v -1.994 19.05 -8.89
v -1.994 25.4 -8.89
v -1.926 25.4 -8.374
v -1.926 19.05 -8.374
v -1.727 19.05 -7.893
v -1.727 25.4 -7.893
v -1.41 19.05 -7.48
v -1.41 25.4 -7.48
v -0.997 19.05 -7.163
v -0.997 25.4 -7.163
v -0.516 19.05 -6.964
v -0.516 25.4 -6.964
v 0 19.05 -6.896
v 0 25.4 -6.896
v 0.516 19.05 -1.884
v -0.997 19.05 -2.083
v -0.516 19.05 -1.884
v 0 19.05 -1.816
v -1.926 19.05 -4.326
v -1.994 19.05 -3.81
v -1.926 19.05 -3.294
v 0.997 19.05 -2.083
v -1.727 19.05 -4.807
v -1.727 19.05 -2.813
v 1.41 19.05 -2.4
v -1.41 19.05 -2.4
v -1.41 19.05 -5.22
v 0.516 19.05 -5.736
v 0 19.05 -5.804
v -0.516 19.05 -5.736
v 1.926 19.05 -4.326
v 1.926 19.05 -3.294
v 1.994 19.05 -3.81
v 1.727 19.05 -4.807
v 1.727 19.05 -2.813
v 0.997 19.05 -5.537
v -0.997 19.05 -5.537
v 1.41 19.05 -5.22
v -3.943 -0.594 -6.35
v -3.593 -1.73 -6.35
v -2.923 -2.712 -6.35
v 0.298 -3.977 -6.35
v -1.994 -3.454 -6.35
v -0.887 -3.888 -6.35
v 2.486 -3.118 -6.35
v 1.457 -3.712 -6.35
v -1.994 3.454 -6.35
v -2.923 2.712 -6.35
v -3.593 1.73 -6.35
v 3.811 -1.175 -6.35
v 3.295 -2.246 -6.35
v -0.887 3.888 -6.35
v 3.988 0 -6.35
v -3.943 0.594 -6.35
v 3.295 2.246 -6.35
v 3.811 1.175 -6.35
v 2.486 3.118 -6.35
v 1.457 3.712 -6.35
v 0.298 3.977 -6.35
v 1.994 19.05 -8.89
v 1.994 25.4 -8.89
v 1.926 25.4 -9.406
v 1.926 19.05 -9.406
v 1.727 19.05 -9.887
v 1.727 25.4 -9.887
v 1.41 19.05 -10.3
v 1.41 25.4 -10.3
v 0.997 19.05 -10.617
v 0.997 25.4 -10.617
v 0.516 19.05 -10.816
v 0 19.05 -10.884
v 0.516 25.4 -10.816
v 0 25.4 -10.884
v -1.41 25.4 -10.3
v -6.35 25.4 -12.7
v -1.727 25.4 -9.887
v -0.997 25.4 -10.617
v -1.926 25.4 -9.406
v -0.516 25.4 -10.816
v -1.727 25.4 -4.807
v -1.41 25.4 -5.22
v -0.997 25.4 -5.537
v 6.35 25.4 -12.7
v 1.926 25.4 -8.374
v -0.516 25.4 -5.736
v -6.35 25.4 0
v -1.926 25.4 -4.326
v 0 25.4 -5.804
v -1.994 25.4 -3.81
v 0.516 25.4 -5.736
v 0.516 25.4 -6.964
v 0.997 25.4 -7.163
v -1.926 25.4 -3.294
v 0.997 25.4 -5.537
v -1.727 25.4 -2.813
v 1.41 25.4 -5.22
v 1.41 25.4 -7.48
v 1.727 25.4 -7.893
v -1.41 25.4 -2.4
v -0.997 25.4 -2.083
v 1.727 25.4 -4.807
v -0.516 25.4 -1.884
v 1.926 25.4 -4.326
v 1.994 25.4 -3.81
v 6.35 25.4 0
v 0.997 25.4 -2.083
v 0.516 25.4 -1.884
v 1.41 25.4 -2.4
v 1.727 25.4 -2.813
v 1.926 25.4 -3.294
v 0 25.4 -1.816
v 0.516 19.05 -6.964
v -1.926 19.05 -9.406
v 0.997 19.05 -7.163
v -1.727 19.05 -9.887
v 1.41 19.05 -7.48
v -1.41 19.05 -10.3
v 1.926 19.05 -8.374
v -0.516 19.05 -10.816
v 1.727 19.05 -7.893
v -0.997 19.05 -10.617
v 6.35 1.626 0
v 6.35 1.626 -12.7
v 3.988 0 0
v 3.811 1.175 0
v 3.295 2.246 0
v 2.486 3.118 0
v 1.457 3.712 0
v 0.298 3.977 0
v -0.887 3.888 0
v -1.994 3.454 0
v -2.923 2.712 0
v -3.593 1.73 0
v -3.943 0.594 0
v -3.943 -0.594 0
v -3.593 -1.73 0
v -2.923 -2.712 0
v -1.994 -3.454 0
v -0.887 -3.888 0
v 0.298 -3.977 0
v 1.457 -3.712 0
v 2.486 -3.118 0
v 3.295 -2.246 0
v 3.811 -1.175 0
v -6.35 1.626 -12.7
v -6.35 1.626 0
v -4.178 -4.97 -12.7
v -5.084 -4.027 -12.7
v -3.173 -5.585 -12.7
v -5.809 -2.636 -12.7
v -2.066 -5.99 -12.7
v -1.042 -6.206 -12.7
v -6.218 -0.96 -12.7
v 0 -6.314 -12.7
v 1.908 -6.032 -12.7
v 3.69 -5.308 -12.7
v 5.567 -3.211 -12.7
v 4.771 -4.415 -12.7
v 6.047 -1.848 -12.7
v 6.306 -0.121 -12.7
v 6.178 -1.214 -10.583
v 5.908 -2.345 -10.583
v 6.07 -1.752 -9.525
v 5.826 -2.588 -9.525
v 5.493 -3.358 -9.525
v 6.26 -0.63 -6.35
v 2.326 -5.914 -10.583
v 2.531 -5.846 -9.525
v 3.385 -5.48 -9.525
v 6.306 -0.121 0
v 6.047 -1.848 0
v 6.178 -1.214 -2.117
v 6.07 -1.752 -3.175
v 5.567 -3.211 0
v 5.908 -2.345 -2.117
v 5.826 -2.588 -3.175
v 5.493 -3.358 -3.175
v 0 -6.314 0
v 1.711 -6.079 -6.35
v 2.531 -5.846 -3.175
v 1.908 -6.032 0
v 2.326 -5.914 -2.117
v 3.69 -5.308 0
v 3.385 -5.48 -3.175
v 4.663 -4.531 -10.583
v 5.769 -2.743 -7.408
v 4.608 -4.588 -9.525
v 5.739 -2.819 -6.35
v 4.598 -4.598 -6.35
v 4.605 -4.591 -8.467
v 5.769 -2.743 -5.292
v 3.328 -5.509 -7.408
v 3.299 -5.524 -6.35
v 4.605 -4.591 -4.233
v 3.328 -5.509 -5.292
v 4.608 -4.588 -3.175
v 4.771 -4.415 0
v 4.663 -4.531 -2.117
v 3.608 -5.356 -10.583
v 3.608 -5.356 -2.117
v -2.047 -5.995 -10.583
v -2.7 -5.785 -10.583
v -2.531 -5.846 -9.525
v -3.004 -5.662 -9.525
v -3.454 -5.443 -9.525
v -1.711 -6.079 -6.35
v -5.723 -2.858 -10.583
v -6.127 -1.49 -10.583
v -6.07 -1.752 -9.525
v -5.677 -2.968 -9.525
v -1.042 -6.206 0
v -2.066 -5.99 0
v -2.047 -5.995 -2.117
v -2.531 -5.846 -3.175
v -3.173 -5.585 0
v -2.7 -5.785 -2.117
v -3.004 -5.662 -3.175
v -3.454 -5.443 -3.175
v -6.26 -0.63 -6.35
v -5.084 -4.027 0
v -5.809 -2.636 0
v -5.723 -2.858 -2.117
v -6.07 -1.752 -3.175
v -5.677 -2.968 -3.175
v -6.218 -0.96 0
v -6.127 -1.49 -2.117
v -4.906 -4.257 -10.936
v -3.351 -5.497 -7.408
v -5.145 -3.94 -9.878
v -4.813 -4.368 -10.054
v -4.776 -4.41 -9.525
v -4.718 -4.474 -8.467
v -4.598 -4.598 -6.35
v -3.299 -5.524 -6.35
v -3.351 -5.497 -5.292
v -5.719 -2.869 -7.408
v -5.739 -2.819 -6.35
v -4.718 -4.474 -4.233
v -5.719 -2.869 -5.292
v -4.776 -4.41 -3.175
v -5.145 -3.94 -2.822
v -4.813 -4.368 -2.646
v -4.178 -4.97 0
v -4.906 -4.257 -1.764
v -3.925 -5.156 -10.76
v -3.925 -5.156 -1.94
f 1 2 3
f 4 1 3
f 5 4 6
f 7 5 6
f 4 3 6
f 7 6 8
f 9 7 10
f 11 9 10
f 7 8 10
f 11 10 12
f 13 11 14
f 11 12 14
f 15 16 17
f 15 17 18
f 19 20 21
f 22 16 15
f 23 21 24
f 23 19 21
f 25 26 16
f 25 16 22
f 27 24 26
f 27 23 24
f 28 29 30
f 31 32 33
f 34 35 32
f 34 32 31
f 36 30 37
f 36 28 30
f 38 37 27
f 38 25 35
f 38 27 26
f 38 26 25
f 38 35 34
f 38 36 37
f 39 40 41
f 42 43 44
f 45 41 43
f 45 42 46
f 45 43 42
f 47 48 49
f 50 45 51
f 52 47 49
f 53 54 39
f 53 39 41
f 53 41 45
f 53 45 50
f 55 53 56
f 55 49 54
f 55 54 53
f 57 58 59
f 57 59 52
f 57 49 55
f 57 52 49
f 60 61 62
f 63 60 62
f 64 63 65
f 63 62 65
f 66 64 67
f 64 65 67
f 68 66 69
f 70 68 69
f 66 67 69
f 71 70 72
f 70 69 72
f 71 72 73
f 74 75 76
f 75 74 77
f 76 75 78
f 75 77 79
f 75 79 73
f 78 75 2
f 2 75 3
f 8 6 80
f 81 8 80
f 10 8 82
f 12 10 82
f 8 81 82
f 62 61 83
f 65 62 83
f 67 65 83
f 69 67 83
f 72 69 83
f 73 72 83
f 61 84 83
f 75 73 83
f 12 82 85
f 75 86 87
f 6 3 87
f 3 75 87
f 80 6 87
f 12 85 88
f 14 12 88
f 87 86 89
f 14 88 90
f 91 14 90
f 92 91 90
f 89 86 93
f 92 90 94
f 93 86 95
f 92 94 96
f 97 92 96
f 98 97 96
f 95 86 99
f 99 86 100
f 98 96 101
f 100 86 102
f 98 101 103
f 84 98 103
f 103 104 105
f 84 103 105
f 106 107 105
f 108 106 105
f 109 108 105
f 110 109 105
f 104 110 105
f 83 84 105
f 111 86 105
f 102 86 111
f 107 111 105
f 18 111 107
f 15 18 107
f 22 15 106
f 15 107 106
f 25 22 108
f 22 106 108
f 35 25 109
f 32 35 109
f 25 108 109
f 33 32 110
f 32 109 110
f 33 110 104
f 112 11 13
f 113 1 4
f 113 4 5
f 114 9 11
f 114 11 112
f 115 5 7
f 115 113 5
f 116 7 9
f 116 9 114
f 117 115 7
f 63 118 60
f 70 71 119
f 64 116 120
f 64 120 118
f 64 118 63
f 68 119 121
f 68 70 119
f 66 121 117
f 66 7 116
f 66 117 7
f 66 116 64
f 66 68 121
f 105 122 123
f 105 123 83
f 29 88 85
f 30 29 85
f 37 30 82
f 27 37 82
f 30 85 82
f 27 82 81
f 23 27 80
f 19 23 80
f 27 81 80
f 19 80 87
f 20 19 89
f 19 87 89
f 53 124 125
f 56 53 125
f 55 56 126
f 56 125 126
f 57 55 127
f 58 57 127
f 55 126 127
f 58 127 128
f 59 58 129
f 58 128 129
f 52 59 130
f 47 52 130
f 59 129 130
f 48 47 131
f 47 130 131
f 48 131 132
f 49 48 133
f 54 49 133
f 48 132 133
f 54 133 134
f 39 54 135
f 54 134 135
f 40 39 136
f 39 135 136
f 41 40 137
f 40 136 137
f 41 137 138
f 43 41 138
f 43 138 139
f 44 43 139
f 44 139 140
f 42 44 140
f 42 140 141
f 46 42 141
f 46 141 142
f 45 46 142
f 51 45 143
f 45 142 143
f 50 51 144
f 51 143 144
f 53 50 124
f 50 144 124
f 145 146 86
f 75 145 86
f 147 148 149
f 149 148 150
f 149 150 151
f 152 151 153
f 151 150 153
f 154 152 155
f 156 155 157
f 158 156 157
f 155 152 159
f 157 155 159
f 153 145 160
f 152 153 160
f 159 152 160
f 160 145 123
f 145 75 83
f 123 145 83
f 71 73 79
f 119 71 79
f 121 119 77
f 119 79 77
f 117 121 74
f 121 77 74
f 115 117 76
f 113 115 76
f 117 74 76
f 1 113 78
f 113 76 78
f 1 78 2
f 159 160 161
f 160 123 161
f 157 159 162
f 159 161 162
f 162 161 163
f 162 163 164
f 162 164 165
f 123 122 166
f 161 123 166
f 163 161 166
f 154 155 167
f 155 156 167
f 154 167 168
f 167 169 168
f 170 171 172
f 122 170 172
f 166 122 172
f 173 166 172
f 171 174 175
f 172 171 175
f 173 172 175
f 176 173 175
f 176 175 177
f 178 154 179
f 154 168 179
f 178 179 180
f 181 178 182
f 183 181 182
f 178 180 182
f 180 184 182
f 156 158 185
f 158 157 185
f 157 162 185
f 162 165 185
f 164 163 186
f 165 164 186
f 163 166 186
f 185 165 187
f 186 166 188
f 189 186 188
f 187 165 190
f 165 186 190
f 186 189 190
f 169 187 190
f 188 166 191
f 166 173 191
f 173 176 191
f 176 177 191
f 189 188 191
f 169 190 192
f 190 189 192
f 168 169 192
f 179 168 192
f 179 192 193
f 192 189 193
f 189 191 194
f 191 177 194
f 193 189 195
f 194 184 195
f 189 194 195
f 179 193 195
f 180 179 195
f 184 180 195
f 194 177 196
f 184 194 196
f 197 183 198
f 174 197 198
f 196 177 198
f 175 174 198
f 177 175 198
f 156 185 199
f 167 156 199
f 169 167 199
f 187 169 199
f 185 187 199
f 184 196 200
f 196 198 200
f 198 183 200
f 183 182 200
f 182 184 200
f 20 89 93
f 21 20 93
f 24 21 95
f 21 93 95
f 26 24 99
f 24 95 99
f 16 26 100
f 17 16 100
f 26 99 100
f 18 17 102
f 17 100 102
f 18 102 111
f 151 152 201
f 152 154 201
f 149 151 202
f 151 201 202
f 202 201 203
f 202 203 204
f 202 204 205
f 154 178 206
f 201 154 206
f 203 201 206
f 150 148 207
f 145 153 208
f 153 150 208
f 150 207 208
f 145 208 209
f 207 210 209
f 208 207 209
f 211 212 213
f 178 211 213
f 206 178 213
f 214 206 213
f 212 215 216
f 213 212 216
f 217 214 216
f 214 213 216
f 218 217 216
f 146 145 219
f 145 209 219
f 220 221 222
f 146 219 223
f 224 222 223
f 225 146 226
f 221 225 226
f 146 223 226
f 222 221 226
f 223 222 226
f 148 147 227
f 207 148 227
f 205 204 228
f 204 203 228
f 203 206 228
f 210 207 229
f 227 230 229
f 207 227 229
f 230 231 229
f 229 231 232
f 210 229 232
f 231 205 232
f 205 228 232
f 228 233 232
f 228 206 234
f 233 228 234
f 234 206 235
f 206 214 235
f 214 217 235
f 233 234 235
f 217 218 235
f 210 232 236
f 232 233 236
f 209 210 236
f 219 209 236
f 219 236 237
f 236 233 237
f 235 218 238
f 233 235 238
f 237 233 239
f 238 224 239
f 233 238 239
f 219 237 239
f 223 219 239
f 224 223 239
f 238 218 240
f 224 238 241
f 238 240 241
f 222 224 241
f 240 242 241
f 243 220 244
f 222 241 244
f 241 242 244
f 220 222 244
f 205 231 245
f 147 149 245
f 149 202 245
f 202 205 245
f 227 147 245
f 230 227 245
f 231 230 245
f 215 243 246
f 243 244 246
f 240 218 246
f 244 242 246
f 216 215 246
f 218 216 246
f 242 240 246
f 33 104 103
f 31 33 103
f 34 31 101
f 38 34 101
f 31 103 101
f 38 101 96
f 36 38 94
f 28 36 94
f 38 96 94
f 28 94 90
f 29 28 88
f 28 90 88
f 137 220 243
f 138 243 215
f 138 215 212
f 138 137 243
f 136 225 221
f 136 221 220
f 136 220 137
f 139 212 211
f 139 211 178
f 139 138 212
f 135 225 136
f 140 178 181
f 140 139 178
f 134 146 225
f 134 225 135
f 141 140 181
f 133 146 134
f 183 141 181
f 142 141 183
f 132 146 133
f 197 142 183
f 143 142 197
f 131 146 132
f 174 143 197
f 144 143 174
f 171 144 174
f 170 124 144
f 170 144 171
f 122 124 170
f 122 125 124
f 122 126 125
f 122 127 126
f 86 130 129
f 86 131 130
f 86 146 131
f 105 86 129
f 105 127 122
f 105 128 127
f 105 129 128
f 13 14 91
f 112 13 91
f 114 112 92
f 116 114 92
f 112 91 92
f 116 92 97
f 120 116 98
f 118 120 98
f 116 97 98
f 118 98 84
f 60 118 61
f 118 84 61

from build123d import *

# Parameters (mm, degrees)
SKETCH1_W           = 12.7
SKETCH1_H           = 19.05
SKETCH1_H_2         = 12.7
SKETCH1_R           = 3.9878
BOSS_EXTRUDE1_DEPTH = 12.7
FILLET1_SIZE        = 7.9756
CUT_EXTRUDE2_DEPTH  = 6.35
SKETCH1_3_R         = 3.9878
CUT_EXTRUDE3_DEPTH  = 6.35


with BuildPart() as part:
    # Sketch1 → Boss-Extrude1 (new body)
    # profile 1 of 3: a face of its own
    with BuildSketch(Plane.XY):
        with Locations((0, 15.875)):
            Rectangle(SKETCH1_W, SKETCH1_H)
    # profile 2 of 3: a face of its own
    with BuildSketch(Plane.XY):
        Rectangle(SKETCH1_W, SKETCH1_H_2)
        Circle(SKETCH1_R, mode=Mode.SUBTRACT)
    # profile 3 of 3: a face of its own
    with BuildSketch(Plane.XY):
        Circle(SKETCH1_R)
    extrude(amount=-BOSS_EXTRUDE1_DEPTH)

    # Fillet1
    # a fillet whose section is not a circle: 7.9756 mm, written as the material it takes off along each edge
    with BuildSketch(Plane(origin=(-6.35, -6.35, 19.939), x_dir=(1, 0, 0), z_dir=(0, 0, -1)), Plane(origin=(6.35, -6.35, 19.939), x_dir=(0, 1, 0), z_dir=(0, 0, -1))) as fillet1_piece_1:
        with BuildLine():
            add(Edge.make_bspline([(FILLET1_SIZE, 0), (FILLET1_SIZE * 0.831801948466, 0), (FILLET1_SIZE * 0.663603896932, 0), (FILLET1_SIZE * 0.292893218813, -FILLET1_SIZE * 0.0716919198361), (FILLET1_SIZE * 0.0716919198361, -FILLET1_SIZE * 0.292893218813), (0, -FILLET1_SIZE * 0.663603896932), (0, -FILLET1_SIZE * 0.831801948466), (0, -FILLET1_SIZE)], knots=[0, 0, 0, 0, 0, 0, 0.5, 0.5, 1, 1, 1, 1, 1, 1], degree=5))
            Line((0, -FILLET1_SIZE), (0, 0))
            Line((0, 0), (FILLET1_SIZE, 0))
        make_face()
    extrude(amount=52.578, mode=Mode.SUBTRACT)

    # Sketch3 → Cut-Extrude2 (cut)
    with BuildSketch(Plane(origin=(0, 25.4, 0), x_dir=(1, 0, 0), z_dir=(0, 1, 0))):
        with BuildLine():
            ThreePointArc((1.9939, 8.89), (1.409900211, 10.299900211), (0, 10.8839))
            Line((0, 10.8839), (0, 8.89))
            Line((0, 8.89), (1.9939, 8.89))
        make_face()
        with BuildLine():
            Line((0, 8.89), (0, 10.8839))
            ThreePointArc((0, 10.8839), (-1.409900211, 10.299900211), (-1.9939, 8.89))
            Line((-1.9939, 8.89), (0, 8.89))
        make_face()
        with BuildLine():
            Line((1.9939, 8.89), (0, 8.89))
            Line((0, 8.89), (0, 6.8961))
            ThreePointArc((0, 6.8961), (1.409900211, 7.480099789), (1.9939, 8.89))
        make_face()
        with BuildLine():
            Line((0, 6.8961), (0, 8.89))
            Line((0, 8.89), (-1.9939, 8.89))
            ThreePointArc((-1.9939, 8.89), (-1.409900211, 7.480099789), (0, 6.8961))
        make_face()
        with BuildLine():
            ThreePointArc((1.9939, 3.81), (1.409900211, 5.219900211), (0, 5.8039))
            Line((0, 5.8039), (0, 3.81))
            Line((0, 3.81), (1.9939, 3.81))
        make_face()
        with BuildLine():
            Line((0, 3.81), (0, 5.8039))
            ThreePointArc((0, 5.8039), (-1.409900211, 5.219900211), (-1.9939, 3.81))
            Line((-1.9939, 3.81), (0, 3.81))
        make_face()
        with BuildLine():
            ThreePointArc((0, 1.8161), (1.409900211, 2.400099789), (1.9939, 3.81))
            Line((1.9939, 3.81), (0, 3.81))
            Line((0, 3.81), (0, 1.8161))
        make_face()
        with BuildLine():
            Line((0, 3.81), (-1.9939, 3.81))
            ThreePointArc((-1.9939, 3.81), (-1.409900211, 2.400099789), (0, 1.8161))
            Line((0, 1.8161), (0, 3.81))
        make_face()
    extrude(amount=-CUT_EXTRUDE2_DEPTH, mode=Mode.SUBTRACT)

    # Sketch1<3> → Cut-Extrude3 (cut)
    with BuildSketch(Plane.XY):
        Circle(SKETCH1_3_R)
    extrude(amount=-CUT_EXTRUDE3_DEPTH, mode=Mode.SUBTRACT)


solid = part.part
